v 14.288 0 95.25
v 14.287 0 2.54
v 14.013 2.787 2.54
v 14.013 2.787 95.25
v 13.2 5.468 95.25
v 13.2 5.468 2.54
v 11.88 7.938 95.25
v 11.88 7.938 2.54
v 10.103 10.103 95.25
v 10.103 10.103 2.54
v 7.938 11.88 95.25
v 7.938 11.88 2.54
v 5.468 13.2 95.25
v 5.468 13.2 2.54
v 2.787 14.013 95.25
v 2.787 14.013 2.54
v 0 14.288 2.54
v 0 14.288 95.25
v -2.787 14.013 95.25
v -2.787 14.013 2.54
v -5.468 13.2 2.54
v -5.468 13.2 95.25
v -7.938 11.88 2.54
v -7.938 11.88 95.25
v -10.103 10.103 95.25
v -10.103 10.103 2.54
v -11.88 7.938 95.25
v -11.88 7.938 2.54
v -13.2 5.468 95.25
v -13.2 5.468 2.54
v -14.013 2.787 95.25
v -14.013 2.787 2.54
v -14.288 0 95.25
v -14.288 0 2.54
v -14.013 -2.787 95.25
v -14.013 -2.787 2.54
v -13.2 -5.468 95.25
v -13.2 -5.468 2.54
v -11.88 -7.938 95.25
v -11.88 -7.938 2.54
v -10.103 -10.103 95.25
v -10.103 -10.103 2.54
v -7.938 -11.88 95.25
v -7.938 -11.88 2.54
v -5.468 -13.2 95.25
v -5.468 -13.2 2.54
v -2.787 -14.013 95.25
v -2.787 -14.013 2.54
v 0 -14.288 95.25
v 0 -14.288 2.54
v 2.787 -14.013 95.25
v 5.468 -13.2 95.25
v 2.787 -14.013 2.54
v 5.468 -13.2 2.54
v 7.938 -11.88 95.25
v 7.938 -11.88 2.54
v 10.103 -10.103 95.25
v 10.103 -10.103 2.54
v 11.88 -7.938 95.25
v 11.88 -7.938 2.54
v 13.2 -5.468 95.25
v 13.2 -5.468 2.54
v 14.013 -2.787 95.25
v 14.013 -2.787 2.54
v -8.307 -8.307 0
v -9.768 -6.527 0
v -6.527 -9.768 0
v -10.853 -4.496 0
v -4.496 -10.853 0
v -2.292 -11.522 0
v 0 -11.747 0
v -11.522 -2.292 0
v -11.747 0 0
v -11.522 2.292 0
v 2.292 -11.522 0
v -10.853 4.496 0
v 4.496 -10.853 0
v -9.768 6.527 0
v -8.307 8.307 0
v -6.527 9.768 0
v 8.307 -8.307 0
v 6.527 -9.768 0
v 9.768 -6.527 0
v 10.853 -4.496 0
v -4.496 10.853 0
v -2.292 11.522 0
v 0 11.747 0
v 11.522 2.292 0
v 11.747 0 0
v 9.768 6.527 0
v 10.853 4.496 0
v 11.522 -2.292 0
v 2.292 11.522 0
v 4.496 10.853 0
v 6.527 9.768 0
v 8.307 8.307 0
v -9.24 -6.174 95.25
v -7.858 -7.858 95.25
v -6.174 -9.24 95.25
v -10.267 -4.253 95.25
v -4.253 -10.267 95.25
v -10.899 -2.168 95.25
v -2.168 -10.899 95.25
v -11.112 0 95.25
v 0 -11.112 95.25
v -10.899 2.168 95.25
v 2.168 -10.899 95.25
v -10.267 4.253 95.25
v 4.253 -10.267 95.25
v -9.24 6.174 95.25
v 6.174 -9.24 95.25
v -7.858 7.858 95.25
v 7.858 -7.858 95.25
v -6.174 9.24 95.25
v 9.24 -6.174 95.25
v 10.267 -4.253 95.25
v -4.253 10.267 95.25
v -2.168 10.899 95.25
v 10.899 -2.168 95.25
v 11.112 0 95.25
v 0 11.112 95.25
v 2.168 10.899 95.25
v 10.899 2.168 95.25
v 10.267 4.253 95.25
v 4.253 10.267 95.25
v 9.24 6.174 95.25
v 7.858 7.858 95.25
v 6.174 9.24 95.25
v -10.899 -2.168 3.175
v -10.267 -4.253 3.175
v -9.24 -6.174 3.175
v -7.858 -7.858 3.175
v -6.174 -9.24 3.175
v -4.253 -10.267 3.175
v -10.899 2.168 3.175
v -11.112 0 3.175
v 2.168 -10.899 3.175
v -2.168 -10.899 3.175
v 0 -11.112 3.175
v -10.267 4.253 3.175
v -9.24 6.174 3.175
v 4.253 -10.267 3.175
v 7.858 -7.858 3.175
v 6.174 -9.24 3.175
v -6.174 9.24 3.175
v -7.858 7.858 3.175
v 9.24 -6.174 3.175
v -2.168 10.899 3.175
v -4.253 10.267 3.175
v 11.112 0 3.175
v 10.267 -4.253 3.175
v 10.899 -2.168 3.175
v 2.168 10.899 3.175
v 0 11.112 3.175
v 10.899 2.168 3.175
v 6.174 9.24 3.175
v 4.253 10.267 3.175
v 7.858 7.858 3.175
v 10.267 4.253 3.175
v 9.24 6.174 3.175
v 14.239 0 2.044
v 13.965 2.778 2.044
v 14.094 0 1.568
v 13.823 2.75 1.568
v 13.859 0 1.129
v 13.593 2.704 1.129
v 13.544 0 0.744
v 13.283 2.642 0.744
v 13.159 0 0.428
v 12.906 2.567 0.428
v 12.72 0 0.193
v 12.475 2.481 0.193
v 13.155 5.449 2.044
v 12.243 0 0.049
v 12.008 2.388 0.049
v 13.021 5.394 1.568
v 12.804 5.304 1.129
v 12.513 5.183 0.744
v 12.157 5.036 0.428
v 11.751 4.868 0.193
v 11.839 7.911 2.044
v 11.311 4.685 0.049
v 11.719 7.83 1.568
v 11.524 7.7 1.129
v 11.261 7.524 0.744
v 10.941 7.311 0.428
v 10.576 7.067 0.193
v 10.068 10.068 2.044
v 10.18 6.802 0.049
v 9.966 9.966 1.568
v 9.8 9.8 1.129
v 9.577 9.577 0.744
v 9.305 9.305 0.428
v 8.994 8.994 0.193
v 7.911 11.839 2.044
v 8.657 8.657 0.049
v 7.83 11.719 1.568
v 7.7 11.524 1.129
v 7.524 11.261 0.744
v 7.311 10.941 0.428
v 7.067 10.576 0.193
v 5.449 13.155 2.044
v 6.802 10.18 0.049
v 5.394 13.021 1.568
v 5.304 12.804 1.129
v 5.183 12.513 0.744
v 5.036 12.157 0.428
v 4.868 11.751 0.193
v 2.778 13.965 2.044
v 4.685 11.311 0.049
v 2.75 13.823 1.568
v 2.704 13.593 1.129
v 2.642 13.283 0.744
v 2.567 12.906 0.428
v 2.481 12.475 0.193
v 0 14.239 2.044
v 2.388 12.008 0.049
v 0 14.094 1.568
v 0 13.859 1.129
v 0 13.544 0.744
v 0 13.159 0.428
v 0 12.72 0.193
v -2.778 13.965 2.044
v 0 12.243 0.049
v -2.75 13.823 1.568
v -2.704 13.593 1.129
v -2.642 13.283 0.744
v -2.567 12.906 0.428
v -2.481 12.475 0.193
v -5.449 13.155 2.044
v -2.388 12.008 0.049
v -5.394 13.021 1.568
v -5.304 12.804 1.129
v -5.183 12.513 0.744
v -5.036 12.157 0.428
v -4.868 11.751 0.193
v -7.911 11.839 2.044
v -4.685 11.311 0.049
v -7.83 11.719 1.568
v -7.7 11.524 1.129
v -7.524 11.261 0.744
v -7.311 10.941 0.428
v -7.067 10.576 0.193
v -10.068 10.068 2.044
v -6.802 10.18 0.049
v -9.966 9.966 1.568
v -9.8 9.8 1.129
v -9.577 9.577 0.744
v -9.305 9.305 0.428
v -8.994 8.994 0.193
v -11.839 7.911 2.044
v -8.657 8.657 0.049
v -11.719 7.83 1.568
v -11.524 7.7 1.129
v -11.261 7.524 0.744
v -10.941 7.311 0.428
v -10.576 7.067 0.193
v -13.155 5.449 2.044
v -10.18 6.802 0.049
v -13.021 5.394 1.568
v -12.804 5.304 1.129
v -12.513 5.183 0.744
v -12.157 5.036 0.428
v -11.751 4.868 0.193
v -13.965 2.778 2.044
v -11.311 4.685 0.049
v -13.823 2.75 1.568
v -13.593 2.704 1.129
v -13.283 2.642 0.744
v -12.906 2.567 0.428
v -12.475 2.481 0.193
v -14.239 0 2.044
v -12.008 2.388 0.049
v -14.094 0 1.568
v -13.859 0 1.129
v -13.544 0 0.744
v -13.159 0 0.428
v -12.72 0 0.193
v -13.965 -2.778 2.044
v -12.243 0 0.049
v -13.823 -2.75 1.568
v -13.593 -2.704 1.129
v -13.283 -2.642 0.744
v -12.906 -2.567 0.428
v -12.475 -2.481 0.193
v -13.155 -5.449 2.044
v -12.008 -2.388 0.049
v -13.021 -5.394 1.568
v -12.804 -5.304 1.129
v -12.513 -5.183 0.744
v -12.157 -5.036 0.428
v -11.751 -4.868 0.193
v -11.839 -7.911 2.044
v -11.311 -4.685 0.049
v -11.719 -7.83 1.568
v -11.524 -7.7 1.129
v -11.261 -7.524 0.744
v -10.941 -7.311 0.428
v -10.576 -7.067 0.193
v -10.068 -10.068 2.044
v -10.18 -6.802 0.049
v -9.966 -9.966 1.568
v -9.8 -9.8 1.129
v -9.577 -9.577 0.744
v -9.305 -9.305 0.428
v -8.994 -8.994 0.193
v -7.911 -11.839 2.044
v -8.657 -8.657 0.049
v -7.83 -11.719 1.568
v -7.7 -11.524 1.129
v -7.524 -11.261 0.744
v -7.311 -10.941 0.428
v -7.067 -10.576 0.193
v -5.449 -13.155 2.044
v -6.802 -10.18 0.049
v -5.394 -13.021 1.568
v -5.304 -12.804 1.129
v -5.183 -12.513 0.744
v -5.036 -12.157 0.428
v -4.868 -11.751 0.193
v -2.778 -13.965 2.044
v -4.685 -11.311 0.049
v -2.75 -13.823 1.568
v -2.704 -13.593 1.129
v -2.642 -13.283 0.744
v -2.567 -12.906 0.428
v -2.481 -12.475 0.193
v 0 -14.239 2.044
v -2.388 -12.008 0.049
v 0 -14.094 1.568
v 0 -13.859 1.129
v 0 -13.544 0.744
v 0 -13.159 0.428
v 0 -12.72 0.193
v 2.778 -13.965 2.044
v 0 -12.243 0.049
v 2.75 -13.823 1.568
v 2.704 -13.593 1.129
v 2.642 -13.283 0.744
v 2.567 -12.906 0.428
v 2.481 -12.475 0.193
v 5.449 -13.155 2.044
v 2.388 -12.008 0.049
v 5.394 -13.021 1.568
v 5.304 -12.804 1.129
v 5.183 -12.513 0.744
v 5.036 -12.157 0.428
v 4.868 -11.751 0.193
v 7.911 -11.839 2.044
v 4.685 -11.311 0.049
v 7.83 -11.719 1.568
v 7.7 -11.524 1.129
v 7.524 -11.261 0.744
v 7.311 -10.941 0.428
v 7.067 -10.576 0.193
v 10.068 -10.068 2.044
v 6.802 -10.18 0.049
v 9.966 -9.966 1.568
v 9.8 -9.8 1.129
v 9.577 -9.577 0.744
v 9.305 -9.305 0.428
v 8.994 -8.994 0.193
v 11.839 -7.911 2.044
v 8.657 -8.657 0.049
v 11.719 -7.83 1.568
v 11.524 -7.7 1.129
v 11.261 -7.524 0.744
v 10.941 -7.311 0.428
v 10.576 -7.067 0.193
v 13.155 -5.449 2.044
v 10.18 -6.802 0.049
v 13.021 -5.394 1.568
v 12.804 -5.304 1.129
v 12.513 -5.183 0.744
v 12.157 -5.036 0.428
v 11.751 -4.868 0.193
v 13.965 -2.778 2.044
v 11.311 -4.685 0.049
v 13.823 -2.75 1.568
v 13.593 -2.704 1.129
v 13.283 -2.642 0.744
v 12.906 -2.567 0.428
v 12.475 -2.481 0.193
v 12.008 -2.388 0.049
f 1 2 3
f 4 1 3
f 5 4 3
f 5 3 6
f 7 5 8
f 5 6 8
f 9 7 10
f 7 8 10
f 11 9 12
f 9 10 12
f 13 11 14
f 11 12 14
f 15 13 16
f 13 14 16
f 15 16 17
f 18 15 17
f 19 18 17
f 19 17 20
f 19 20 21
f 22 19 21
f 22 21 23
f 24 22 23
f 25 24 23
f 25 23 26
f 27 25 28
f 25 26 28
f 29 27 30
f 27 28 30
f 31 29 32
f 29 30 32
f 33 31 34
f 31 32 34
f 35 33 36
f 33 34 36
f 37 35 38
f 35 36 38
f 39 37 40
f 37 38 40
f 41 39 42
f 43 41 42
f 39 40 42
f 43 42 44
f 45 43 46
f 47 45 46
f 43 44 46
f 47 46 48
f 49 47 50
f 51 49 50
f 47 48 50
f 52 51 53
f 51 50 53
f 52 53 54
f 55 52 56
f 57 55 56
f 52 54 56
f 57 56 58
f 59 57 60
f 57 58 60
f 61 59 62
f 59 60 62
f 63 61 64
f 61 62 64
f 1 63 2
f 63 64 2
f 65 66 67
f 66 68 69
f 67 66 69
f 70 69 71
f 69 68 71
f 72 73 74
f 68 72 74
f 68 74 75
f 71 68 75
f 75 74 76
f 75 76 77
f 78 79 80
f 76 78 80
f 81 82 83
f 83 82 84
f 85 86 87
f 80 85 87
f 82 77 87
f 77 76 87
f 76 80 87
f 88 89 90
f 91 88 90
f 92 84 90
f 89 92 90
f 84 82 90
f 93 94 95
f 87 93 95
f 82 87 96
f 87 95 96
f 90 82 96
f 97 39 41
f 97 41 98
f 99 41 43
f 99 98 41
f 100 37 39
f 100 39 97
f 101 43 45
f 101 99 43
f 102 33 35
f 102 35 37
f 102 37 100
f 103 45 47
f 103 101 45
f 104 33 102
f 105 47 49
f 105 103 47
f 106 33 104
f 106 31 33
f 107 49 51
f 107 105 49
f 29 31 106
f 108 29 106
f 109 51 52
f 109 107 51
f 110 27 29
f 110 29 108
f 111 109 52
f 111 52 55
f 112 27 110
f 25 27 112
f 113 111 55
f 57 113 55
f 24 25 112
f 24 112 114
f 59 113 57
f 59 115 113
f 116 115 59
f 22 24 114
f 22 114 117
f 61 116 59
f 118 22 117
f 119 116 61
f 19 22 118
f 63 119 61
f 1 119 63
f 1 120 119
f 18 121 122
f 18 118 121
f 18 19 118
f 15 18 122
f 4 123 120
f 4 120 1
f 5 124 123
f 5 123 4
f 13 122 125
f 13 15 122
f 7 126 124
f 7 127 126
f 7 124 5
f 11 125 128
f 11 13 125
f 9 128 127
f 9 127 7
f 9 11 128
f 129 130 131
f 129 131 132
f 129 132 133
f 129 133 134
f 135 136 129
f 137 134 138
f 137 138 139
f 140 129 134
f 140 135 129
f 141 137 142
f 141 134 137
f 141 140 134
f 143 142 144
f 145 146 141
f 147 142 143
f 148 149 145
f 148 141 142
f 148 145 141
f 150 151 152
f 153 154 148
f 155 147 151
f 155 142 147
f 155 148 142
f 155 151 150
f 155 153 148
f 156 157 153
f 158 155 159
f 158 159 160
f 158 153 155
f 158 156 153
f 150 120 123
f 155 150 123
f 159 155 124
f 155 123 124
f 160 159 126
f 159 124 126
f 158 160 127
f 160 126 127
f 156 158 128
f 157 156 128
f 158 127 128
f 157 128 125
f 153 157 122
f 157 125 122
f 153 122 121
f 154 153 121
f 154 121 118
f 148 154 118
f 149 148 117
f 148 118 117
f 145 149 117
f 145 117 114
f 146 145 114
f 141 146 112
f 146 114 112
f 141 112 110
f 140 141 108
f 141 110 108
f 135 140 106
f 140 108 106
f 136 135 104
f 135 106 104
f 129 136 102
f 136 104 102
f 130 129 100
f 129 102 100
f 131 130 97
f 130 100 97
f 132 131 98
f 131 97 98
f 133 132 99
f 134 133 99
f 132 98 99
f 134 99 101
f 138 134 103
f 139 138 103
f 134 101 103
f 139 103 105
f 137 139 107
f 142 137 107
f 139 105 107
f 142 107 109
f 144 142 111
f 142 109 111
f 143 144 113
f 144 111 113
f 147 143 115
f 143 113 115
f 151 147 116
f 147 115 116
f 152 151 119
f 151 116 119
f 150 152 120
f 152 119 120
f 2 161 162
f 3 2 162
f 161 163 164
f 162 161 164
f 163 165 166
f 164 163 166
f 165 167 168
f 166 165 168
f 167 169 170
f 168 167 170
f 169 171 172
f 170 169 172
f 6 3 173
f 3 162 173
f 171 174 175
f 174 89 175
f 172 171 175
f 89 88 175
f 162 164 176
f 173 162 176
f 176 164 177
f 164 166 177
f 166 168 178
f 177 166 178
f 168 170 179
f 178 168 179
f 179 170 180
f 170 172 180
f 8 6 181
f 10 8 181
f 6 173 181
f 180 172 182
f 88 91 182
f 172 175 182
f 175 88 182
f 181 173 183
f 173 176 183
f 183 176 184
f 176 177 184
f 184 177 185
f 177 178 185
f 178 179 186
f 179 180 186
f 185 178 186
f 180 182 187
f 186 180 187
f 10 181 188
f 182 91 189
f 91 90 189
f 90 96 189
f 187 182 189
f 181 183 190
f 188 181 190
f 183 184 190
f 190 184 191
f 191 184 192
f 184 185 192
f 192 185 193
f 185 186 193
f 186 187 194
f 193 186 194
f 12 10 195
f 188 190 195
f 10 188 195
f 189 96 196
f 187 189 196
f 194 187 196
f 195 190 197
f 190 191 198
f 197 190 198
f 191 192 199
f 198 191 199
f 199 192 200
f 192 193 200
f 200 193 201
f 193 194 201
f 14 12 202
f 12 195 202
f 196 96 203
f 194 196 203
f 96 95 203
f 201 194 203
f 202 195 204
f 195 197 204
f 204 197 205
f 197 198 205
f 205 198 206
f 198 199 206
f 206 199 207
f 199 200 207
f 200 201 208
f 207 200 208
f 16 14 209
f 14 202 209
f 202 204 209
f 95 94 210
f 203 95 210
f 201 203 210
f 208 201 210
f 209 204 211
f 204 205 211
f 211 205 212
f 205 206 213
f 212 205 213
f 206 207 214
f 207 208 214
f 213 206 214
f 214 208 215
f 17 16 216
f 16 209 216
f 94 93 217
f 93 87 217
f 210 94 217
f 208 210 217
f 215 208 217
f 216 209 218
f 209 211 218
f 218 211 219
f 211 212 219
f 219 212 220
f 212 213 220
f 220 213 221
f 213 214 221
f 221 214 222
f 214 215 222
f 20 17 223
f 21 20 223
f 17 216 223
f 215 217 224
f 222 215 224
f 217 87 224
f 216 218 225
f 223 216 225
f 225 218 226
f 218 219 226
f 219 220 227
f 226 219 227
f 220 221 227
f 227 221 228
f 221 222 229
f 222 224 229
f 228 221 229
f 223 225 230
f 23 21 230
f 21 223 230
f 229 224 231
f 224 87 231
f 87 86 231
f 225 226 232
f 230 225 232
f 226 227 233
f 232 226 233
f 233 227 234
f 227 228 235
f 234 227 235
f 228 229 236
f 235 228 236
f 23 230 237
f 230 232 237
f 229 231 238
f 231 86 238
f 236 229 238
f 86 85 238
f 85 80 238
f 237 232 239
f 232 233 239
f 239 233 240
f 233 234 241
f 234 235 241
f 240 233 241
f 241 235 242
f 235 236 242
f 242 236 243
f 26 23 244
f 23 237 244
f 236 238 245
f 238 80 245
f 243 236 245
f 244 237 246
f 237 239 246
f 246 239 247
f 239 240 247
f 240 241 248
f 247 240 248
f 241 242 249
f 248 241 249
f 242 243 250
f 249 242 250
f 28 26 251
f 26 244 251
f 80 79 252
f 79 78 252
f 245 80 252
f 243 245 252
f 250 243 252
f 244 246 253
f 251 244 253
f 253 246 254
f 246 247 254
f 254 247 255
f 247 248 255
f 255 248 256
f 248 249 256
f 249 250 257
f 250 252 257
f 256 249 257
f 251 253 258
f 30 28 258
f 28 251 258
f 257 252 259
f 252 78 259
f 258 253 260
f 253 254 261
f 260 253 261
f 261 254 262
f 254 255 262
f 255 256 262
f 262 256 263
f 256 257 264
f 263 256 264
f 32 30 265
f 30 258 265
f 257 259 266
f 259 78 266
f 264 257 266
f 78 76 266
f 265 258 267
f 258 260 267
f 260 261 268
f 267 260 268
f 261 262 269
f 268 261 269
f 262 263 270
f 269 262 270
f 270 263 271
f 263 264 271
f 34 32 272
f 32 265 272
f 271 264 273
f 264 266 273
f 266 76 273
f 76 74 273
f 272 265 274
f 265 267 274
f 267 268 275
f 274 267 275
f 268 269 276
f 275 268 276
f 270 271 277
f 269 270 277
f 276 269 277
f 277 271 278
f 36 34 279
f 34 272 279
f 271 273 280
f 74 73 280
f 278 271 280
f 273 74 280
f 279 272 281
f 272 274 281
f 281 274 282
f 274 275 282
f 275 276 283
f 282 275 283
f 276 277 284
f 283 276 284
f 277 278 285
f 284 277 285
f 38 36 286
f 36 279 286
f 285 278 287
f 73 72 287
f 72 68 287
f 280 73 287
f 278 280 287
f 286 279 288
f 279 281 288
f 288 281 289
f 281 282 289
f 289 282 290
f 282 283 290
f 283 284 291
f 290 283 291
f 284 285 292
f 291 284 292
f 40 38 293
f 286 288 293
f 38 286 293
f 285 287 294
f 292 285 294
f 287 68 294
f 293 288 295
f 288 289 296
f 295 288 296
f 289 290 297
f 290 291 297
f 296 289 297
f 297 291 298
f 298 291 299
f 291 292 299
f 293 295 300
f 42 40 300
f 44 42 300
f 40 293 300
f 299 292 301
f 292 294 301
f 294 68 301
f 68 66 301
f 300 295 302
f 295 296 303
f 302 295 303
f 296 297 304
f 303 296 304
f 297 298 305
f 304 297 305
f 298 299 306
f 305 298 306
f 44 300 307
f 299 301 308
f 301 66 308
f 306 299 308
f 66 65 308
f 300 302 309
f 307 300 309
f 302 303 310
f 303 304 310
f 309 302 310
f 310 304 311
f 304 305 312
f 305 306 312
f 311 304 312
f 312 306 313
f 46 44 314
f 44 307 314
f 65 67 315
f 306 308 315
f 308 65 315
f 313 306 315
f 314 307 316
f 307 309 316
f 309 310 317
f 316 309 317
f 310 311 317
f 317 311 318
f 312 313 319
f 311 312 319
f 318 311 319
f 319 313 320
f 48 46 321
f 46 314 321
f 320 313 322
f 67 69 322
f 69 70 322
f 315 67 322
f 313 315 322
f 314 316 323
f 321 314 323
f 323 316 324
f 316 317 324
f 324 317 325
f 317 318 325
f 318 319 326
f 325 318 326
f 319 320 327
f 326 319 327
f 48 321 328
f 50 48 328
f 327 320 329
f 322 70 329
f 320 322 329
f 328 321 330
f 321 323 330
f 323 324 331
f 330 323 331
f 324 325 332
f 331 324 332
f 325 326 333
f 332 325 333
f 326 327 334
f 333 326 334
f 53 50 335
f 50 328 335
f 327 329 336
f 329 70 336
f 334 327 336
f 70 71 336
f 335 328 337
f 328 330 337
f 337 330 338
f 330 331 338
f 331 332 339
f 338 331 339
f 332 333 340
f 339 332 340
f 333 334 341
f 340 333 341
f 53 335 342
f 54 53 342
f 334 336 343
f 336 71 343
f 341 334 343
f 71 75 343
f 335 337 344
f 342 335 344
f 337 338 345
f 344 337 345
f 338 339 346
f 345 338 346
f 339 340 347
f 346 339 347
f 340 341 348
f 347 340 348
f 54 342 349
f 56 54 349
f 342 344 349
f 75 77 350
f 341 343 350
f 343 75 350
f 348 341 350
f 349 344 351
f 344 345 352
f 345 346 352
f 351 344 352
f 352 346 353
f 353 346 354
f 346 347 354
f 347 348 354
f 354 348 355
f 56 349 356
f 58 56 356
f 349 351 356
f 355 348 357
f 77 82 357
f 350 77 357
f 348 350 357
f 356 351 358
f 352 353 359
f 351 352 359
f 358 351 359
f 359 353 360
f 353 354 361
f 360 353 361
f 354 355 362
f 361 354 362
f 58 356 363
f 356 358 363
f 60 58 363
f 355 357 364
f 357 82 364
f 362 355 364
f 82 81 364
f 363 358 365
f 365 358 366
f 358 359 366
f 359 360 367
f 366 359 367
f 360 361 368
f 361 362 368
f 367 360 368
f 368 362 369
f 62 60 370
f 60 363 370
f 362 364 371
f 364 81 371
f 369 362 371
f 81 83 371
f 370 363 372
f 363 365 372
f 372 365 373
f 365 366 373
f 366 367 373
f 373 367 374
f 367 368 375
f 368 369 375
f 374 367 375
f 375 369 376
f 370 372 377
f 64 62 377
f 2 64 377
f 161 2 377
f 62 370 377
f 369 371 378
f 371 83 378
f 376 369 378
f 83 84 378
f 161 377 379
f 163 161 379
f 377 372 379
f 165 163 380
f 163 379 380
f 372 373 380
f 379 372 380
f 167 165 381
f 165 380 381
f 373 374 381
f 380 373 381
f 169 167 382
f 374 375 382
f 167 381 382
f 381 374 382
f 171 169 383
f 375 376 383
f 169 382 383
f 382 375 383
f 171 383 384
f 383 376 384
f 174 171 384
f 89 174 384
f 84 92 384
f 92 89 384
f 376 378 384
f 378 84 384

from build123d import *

# Parameters (mm, degrees)
SKETCH1_R           = 14.2875
BOSS_EXTRUDE1_DEPTH = 95.25
SKETCH2_R           = 11.1125
CUT_EXTRUDE1_DEPTH  = 92.075
FILLET1_R           = 2.54


with BuildPart() as part:
    # Sketch1 → Boss-Extrude1 (new body)
    with BuildSketch(Plane.XY):
        Circle(SKETCH1_R)
    extrude(amount=BOSS_EXTRUDE1_DEPTH)

    # Sketch2 → Cut-Extrude1 (cut)
    with BuildSketch(Plane.XY.offset(95.25)):
        Circle(SKETCH2_R)
    extrude(amount=-CUT_EXTRUDE1_DEPTH, mode=Mode.SUBTRACT)

    # Fillet1
    fillet1_edges = [part.edges().sort_by_distance(p)[0] for p in [
        (-14.2875, 0, 0),
    ]]
    fillet(fillet1_edges, radius=FILLET1_R)


solid = part.part
